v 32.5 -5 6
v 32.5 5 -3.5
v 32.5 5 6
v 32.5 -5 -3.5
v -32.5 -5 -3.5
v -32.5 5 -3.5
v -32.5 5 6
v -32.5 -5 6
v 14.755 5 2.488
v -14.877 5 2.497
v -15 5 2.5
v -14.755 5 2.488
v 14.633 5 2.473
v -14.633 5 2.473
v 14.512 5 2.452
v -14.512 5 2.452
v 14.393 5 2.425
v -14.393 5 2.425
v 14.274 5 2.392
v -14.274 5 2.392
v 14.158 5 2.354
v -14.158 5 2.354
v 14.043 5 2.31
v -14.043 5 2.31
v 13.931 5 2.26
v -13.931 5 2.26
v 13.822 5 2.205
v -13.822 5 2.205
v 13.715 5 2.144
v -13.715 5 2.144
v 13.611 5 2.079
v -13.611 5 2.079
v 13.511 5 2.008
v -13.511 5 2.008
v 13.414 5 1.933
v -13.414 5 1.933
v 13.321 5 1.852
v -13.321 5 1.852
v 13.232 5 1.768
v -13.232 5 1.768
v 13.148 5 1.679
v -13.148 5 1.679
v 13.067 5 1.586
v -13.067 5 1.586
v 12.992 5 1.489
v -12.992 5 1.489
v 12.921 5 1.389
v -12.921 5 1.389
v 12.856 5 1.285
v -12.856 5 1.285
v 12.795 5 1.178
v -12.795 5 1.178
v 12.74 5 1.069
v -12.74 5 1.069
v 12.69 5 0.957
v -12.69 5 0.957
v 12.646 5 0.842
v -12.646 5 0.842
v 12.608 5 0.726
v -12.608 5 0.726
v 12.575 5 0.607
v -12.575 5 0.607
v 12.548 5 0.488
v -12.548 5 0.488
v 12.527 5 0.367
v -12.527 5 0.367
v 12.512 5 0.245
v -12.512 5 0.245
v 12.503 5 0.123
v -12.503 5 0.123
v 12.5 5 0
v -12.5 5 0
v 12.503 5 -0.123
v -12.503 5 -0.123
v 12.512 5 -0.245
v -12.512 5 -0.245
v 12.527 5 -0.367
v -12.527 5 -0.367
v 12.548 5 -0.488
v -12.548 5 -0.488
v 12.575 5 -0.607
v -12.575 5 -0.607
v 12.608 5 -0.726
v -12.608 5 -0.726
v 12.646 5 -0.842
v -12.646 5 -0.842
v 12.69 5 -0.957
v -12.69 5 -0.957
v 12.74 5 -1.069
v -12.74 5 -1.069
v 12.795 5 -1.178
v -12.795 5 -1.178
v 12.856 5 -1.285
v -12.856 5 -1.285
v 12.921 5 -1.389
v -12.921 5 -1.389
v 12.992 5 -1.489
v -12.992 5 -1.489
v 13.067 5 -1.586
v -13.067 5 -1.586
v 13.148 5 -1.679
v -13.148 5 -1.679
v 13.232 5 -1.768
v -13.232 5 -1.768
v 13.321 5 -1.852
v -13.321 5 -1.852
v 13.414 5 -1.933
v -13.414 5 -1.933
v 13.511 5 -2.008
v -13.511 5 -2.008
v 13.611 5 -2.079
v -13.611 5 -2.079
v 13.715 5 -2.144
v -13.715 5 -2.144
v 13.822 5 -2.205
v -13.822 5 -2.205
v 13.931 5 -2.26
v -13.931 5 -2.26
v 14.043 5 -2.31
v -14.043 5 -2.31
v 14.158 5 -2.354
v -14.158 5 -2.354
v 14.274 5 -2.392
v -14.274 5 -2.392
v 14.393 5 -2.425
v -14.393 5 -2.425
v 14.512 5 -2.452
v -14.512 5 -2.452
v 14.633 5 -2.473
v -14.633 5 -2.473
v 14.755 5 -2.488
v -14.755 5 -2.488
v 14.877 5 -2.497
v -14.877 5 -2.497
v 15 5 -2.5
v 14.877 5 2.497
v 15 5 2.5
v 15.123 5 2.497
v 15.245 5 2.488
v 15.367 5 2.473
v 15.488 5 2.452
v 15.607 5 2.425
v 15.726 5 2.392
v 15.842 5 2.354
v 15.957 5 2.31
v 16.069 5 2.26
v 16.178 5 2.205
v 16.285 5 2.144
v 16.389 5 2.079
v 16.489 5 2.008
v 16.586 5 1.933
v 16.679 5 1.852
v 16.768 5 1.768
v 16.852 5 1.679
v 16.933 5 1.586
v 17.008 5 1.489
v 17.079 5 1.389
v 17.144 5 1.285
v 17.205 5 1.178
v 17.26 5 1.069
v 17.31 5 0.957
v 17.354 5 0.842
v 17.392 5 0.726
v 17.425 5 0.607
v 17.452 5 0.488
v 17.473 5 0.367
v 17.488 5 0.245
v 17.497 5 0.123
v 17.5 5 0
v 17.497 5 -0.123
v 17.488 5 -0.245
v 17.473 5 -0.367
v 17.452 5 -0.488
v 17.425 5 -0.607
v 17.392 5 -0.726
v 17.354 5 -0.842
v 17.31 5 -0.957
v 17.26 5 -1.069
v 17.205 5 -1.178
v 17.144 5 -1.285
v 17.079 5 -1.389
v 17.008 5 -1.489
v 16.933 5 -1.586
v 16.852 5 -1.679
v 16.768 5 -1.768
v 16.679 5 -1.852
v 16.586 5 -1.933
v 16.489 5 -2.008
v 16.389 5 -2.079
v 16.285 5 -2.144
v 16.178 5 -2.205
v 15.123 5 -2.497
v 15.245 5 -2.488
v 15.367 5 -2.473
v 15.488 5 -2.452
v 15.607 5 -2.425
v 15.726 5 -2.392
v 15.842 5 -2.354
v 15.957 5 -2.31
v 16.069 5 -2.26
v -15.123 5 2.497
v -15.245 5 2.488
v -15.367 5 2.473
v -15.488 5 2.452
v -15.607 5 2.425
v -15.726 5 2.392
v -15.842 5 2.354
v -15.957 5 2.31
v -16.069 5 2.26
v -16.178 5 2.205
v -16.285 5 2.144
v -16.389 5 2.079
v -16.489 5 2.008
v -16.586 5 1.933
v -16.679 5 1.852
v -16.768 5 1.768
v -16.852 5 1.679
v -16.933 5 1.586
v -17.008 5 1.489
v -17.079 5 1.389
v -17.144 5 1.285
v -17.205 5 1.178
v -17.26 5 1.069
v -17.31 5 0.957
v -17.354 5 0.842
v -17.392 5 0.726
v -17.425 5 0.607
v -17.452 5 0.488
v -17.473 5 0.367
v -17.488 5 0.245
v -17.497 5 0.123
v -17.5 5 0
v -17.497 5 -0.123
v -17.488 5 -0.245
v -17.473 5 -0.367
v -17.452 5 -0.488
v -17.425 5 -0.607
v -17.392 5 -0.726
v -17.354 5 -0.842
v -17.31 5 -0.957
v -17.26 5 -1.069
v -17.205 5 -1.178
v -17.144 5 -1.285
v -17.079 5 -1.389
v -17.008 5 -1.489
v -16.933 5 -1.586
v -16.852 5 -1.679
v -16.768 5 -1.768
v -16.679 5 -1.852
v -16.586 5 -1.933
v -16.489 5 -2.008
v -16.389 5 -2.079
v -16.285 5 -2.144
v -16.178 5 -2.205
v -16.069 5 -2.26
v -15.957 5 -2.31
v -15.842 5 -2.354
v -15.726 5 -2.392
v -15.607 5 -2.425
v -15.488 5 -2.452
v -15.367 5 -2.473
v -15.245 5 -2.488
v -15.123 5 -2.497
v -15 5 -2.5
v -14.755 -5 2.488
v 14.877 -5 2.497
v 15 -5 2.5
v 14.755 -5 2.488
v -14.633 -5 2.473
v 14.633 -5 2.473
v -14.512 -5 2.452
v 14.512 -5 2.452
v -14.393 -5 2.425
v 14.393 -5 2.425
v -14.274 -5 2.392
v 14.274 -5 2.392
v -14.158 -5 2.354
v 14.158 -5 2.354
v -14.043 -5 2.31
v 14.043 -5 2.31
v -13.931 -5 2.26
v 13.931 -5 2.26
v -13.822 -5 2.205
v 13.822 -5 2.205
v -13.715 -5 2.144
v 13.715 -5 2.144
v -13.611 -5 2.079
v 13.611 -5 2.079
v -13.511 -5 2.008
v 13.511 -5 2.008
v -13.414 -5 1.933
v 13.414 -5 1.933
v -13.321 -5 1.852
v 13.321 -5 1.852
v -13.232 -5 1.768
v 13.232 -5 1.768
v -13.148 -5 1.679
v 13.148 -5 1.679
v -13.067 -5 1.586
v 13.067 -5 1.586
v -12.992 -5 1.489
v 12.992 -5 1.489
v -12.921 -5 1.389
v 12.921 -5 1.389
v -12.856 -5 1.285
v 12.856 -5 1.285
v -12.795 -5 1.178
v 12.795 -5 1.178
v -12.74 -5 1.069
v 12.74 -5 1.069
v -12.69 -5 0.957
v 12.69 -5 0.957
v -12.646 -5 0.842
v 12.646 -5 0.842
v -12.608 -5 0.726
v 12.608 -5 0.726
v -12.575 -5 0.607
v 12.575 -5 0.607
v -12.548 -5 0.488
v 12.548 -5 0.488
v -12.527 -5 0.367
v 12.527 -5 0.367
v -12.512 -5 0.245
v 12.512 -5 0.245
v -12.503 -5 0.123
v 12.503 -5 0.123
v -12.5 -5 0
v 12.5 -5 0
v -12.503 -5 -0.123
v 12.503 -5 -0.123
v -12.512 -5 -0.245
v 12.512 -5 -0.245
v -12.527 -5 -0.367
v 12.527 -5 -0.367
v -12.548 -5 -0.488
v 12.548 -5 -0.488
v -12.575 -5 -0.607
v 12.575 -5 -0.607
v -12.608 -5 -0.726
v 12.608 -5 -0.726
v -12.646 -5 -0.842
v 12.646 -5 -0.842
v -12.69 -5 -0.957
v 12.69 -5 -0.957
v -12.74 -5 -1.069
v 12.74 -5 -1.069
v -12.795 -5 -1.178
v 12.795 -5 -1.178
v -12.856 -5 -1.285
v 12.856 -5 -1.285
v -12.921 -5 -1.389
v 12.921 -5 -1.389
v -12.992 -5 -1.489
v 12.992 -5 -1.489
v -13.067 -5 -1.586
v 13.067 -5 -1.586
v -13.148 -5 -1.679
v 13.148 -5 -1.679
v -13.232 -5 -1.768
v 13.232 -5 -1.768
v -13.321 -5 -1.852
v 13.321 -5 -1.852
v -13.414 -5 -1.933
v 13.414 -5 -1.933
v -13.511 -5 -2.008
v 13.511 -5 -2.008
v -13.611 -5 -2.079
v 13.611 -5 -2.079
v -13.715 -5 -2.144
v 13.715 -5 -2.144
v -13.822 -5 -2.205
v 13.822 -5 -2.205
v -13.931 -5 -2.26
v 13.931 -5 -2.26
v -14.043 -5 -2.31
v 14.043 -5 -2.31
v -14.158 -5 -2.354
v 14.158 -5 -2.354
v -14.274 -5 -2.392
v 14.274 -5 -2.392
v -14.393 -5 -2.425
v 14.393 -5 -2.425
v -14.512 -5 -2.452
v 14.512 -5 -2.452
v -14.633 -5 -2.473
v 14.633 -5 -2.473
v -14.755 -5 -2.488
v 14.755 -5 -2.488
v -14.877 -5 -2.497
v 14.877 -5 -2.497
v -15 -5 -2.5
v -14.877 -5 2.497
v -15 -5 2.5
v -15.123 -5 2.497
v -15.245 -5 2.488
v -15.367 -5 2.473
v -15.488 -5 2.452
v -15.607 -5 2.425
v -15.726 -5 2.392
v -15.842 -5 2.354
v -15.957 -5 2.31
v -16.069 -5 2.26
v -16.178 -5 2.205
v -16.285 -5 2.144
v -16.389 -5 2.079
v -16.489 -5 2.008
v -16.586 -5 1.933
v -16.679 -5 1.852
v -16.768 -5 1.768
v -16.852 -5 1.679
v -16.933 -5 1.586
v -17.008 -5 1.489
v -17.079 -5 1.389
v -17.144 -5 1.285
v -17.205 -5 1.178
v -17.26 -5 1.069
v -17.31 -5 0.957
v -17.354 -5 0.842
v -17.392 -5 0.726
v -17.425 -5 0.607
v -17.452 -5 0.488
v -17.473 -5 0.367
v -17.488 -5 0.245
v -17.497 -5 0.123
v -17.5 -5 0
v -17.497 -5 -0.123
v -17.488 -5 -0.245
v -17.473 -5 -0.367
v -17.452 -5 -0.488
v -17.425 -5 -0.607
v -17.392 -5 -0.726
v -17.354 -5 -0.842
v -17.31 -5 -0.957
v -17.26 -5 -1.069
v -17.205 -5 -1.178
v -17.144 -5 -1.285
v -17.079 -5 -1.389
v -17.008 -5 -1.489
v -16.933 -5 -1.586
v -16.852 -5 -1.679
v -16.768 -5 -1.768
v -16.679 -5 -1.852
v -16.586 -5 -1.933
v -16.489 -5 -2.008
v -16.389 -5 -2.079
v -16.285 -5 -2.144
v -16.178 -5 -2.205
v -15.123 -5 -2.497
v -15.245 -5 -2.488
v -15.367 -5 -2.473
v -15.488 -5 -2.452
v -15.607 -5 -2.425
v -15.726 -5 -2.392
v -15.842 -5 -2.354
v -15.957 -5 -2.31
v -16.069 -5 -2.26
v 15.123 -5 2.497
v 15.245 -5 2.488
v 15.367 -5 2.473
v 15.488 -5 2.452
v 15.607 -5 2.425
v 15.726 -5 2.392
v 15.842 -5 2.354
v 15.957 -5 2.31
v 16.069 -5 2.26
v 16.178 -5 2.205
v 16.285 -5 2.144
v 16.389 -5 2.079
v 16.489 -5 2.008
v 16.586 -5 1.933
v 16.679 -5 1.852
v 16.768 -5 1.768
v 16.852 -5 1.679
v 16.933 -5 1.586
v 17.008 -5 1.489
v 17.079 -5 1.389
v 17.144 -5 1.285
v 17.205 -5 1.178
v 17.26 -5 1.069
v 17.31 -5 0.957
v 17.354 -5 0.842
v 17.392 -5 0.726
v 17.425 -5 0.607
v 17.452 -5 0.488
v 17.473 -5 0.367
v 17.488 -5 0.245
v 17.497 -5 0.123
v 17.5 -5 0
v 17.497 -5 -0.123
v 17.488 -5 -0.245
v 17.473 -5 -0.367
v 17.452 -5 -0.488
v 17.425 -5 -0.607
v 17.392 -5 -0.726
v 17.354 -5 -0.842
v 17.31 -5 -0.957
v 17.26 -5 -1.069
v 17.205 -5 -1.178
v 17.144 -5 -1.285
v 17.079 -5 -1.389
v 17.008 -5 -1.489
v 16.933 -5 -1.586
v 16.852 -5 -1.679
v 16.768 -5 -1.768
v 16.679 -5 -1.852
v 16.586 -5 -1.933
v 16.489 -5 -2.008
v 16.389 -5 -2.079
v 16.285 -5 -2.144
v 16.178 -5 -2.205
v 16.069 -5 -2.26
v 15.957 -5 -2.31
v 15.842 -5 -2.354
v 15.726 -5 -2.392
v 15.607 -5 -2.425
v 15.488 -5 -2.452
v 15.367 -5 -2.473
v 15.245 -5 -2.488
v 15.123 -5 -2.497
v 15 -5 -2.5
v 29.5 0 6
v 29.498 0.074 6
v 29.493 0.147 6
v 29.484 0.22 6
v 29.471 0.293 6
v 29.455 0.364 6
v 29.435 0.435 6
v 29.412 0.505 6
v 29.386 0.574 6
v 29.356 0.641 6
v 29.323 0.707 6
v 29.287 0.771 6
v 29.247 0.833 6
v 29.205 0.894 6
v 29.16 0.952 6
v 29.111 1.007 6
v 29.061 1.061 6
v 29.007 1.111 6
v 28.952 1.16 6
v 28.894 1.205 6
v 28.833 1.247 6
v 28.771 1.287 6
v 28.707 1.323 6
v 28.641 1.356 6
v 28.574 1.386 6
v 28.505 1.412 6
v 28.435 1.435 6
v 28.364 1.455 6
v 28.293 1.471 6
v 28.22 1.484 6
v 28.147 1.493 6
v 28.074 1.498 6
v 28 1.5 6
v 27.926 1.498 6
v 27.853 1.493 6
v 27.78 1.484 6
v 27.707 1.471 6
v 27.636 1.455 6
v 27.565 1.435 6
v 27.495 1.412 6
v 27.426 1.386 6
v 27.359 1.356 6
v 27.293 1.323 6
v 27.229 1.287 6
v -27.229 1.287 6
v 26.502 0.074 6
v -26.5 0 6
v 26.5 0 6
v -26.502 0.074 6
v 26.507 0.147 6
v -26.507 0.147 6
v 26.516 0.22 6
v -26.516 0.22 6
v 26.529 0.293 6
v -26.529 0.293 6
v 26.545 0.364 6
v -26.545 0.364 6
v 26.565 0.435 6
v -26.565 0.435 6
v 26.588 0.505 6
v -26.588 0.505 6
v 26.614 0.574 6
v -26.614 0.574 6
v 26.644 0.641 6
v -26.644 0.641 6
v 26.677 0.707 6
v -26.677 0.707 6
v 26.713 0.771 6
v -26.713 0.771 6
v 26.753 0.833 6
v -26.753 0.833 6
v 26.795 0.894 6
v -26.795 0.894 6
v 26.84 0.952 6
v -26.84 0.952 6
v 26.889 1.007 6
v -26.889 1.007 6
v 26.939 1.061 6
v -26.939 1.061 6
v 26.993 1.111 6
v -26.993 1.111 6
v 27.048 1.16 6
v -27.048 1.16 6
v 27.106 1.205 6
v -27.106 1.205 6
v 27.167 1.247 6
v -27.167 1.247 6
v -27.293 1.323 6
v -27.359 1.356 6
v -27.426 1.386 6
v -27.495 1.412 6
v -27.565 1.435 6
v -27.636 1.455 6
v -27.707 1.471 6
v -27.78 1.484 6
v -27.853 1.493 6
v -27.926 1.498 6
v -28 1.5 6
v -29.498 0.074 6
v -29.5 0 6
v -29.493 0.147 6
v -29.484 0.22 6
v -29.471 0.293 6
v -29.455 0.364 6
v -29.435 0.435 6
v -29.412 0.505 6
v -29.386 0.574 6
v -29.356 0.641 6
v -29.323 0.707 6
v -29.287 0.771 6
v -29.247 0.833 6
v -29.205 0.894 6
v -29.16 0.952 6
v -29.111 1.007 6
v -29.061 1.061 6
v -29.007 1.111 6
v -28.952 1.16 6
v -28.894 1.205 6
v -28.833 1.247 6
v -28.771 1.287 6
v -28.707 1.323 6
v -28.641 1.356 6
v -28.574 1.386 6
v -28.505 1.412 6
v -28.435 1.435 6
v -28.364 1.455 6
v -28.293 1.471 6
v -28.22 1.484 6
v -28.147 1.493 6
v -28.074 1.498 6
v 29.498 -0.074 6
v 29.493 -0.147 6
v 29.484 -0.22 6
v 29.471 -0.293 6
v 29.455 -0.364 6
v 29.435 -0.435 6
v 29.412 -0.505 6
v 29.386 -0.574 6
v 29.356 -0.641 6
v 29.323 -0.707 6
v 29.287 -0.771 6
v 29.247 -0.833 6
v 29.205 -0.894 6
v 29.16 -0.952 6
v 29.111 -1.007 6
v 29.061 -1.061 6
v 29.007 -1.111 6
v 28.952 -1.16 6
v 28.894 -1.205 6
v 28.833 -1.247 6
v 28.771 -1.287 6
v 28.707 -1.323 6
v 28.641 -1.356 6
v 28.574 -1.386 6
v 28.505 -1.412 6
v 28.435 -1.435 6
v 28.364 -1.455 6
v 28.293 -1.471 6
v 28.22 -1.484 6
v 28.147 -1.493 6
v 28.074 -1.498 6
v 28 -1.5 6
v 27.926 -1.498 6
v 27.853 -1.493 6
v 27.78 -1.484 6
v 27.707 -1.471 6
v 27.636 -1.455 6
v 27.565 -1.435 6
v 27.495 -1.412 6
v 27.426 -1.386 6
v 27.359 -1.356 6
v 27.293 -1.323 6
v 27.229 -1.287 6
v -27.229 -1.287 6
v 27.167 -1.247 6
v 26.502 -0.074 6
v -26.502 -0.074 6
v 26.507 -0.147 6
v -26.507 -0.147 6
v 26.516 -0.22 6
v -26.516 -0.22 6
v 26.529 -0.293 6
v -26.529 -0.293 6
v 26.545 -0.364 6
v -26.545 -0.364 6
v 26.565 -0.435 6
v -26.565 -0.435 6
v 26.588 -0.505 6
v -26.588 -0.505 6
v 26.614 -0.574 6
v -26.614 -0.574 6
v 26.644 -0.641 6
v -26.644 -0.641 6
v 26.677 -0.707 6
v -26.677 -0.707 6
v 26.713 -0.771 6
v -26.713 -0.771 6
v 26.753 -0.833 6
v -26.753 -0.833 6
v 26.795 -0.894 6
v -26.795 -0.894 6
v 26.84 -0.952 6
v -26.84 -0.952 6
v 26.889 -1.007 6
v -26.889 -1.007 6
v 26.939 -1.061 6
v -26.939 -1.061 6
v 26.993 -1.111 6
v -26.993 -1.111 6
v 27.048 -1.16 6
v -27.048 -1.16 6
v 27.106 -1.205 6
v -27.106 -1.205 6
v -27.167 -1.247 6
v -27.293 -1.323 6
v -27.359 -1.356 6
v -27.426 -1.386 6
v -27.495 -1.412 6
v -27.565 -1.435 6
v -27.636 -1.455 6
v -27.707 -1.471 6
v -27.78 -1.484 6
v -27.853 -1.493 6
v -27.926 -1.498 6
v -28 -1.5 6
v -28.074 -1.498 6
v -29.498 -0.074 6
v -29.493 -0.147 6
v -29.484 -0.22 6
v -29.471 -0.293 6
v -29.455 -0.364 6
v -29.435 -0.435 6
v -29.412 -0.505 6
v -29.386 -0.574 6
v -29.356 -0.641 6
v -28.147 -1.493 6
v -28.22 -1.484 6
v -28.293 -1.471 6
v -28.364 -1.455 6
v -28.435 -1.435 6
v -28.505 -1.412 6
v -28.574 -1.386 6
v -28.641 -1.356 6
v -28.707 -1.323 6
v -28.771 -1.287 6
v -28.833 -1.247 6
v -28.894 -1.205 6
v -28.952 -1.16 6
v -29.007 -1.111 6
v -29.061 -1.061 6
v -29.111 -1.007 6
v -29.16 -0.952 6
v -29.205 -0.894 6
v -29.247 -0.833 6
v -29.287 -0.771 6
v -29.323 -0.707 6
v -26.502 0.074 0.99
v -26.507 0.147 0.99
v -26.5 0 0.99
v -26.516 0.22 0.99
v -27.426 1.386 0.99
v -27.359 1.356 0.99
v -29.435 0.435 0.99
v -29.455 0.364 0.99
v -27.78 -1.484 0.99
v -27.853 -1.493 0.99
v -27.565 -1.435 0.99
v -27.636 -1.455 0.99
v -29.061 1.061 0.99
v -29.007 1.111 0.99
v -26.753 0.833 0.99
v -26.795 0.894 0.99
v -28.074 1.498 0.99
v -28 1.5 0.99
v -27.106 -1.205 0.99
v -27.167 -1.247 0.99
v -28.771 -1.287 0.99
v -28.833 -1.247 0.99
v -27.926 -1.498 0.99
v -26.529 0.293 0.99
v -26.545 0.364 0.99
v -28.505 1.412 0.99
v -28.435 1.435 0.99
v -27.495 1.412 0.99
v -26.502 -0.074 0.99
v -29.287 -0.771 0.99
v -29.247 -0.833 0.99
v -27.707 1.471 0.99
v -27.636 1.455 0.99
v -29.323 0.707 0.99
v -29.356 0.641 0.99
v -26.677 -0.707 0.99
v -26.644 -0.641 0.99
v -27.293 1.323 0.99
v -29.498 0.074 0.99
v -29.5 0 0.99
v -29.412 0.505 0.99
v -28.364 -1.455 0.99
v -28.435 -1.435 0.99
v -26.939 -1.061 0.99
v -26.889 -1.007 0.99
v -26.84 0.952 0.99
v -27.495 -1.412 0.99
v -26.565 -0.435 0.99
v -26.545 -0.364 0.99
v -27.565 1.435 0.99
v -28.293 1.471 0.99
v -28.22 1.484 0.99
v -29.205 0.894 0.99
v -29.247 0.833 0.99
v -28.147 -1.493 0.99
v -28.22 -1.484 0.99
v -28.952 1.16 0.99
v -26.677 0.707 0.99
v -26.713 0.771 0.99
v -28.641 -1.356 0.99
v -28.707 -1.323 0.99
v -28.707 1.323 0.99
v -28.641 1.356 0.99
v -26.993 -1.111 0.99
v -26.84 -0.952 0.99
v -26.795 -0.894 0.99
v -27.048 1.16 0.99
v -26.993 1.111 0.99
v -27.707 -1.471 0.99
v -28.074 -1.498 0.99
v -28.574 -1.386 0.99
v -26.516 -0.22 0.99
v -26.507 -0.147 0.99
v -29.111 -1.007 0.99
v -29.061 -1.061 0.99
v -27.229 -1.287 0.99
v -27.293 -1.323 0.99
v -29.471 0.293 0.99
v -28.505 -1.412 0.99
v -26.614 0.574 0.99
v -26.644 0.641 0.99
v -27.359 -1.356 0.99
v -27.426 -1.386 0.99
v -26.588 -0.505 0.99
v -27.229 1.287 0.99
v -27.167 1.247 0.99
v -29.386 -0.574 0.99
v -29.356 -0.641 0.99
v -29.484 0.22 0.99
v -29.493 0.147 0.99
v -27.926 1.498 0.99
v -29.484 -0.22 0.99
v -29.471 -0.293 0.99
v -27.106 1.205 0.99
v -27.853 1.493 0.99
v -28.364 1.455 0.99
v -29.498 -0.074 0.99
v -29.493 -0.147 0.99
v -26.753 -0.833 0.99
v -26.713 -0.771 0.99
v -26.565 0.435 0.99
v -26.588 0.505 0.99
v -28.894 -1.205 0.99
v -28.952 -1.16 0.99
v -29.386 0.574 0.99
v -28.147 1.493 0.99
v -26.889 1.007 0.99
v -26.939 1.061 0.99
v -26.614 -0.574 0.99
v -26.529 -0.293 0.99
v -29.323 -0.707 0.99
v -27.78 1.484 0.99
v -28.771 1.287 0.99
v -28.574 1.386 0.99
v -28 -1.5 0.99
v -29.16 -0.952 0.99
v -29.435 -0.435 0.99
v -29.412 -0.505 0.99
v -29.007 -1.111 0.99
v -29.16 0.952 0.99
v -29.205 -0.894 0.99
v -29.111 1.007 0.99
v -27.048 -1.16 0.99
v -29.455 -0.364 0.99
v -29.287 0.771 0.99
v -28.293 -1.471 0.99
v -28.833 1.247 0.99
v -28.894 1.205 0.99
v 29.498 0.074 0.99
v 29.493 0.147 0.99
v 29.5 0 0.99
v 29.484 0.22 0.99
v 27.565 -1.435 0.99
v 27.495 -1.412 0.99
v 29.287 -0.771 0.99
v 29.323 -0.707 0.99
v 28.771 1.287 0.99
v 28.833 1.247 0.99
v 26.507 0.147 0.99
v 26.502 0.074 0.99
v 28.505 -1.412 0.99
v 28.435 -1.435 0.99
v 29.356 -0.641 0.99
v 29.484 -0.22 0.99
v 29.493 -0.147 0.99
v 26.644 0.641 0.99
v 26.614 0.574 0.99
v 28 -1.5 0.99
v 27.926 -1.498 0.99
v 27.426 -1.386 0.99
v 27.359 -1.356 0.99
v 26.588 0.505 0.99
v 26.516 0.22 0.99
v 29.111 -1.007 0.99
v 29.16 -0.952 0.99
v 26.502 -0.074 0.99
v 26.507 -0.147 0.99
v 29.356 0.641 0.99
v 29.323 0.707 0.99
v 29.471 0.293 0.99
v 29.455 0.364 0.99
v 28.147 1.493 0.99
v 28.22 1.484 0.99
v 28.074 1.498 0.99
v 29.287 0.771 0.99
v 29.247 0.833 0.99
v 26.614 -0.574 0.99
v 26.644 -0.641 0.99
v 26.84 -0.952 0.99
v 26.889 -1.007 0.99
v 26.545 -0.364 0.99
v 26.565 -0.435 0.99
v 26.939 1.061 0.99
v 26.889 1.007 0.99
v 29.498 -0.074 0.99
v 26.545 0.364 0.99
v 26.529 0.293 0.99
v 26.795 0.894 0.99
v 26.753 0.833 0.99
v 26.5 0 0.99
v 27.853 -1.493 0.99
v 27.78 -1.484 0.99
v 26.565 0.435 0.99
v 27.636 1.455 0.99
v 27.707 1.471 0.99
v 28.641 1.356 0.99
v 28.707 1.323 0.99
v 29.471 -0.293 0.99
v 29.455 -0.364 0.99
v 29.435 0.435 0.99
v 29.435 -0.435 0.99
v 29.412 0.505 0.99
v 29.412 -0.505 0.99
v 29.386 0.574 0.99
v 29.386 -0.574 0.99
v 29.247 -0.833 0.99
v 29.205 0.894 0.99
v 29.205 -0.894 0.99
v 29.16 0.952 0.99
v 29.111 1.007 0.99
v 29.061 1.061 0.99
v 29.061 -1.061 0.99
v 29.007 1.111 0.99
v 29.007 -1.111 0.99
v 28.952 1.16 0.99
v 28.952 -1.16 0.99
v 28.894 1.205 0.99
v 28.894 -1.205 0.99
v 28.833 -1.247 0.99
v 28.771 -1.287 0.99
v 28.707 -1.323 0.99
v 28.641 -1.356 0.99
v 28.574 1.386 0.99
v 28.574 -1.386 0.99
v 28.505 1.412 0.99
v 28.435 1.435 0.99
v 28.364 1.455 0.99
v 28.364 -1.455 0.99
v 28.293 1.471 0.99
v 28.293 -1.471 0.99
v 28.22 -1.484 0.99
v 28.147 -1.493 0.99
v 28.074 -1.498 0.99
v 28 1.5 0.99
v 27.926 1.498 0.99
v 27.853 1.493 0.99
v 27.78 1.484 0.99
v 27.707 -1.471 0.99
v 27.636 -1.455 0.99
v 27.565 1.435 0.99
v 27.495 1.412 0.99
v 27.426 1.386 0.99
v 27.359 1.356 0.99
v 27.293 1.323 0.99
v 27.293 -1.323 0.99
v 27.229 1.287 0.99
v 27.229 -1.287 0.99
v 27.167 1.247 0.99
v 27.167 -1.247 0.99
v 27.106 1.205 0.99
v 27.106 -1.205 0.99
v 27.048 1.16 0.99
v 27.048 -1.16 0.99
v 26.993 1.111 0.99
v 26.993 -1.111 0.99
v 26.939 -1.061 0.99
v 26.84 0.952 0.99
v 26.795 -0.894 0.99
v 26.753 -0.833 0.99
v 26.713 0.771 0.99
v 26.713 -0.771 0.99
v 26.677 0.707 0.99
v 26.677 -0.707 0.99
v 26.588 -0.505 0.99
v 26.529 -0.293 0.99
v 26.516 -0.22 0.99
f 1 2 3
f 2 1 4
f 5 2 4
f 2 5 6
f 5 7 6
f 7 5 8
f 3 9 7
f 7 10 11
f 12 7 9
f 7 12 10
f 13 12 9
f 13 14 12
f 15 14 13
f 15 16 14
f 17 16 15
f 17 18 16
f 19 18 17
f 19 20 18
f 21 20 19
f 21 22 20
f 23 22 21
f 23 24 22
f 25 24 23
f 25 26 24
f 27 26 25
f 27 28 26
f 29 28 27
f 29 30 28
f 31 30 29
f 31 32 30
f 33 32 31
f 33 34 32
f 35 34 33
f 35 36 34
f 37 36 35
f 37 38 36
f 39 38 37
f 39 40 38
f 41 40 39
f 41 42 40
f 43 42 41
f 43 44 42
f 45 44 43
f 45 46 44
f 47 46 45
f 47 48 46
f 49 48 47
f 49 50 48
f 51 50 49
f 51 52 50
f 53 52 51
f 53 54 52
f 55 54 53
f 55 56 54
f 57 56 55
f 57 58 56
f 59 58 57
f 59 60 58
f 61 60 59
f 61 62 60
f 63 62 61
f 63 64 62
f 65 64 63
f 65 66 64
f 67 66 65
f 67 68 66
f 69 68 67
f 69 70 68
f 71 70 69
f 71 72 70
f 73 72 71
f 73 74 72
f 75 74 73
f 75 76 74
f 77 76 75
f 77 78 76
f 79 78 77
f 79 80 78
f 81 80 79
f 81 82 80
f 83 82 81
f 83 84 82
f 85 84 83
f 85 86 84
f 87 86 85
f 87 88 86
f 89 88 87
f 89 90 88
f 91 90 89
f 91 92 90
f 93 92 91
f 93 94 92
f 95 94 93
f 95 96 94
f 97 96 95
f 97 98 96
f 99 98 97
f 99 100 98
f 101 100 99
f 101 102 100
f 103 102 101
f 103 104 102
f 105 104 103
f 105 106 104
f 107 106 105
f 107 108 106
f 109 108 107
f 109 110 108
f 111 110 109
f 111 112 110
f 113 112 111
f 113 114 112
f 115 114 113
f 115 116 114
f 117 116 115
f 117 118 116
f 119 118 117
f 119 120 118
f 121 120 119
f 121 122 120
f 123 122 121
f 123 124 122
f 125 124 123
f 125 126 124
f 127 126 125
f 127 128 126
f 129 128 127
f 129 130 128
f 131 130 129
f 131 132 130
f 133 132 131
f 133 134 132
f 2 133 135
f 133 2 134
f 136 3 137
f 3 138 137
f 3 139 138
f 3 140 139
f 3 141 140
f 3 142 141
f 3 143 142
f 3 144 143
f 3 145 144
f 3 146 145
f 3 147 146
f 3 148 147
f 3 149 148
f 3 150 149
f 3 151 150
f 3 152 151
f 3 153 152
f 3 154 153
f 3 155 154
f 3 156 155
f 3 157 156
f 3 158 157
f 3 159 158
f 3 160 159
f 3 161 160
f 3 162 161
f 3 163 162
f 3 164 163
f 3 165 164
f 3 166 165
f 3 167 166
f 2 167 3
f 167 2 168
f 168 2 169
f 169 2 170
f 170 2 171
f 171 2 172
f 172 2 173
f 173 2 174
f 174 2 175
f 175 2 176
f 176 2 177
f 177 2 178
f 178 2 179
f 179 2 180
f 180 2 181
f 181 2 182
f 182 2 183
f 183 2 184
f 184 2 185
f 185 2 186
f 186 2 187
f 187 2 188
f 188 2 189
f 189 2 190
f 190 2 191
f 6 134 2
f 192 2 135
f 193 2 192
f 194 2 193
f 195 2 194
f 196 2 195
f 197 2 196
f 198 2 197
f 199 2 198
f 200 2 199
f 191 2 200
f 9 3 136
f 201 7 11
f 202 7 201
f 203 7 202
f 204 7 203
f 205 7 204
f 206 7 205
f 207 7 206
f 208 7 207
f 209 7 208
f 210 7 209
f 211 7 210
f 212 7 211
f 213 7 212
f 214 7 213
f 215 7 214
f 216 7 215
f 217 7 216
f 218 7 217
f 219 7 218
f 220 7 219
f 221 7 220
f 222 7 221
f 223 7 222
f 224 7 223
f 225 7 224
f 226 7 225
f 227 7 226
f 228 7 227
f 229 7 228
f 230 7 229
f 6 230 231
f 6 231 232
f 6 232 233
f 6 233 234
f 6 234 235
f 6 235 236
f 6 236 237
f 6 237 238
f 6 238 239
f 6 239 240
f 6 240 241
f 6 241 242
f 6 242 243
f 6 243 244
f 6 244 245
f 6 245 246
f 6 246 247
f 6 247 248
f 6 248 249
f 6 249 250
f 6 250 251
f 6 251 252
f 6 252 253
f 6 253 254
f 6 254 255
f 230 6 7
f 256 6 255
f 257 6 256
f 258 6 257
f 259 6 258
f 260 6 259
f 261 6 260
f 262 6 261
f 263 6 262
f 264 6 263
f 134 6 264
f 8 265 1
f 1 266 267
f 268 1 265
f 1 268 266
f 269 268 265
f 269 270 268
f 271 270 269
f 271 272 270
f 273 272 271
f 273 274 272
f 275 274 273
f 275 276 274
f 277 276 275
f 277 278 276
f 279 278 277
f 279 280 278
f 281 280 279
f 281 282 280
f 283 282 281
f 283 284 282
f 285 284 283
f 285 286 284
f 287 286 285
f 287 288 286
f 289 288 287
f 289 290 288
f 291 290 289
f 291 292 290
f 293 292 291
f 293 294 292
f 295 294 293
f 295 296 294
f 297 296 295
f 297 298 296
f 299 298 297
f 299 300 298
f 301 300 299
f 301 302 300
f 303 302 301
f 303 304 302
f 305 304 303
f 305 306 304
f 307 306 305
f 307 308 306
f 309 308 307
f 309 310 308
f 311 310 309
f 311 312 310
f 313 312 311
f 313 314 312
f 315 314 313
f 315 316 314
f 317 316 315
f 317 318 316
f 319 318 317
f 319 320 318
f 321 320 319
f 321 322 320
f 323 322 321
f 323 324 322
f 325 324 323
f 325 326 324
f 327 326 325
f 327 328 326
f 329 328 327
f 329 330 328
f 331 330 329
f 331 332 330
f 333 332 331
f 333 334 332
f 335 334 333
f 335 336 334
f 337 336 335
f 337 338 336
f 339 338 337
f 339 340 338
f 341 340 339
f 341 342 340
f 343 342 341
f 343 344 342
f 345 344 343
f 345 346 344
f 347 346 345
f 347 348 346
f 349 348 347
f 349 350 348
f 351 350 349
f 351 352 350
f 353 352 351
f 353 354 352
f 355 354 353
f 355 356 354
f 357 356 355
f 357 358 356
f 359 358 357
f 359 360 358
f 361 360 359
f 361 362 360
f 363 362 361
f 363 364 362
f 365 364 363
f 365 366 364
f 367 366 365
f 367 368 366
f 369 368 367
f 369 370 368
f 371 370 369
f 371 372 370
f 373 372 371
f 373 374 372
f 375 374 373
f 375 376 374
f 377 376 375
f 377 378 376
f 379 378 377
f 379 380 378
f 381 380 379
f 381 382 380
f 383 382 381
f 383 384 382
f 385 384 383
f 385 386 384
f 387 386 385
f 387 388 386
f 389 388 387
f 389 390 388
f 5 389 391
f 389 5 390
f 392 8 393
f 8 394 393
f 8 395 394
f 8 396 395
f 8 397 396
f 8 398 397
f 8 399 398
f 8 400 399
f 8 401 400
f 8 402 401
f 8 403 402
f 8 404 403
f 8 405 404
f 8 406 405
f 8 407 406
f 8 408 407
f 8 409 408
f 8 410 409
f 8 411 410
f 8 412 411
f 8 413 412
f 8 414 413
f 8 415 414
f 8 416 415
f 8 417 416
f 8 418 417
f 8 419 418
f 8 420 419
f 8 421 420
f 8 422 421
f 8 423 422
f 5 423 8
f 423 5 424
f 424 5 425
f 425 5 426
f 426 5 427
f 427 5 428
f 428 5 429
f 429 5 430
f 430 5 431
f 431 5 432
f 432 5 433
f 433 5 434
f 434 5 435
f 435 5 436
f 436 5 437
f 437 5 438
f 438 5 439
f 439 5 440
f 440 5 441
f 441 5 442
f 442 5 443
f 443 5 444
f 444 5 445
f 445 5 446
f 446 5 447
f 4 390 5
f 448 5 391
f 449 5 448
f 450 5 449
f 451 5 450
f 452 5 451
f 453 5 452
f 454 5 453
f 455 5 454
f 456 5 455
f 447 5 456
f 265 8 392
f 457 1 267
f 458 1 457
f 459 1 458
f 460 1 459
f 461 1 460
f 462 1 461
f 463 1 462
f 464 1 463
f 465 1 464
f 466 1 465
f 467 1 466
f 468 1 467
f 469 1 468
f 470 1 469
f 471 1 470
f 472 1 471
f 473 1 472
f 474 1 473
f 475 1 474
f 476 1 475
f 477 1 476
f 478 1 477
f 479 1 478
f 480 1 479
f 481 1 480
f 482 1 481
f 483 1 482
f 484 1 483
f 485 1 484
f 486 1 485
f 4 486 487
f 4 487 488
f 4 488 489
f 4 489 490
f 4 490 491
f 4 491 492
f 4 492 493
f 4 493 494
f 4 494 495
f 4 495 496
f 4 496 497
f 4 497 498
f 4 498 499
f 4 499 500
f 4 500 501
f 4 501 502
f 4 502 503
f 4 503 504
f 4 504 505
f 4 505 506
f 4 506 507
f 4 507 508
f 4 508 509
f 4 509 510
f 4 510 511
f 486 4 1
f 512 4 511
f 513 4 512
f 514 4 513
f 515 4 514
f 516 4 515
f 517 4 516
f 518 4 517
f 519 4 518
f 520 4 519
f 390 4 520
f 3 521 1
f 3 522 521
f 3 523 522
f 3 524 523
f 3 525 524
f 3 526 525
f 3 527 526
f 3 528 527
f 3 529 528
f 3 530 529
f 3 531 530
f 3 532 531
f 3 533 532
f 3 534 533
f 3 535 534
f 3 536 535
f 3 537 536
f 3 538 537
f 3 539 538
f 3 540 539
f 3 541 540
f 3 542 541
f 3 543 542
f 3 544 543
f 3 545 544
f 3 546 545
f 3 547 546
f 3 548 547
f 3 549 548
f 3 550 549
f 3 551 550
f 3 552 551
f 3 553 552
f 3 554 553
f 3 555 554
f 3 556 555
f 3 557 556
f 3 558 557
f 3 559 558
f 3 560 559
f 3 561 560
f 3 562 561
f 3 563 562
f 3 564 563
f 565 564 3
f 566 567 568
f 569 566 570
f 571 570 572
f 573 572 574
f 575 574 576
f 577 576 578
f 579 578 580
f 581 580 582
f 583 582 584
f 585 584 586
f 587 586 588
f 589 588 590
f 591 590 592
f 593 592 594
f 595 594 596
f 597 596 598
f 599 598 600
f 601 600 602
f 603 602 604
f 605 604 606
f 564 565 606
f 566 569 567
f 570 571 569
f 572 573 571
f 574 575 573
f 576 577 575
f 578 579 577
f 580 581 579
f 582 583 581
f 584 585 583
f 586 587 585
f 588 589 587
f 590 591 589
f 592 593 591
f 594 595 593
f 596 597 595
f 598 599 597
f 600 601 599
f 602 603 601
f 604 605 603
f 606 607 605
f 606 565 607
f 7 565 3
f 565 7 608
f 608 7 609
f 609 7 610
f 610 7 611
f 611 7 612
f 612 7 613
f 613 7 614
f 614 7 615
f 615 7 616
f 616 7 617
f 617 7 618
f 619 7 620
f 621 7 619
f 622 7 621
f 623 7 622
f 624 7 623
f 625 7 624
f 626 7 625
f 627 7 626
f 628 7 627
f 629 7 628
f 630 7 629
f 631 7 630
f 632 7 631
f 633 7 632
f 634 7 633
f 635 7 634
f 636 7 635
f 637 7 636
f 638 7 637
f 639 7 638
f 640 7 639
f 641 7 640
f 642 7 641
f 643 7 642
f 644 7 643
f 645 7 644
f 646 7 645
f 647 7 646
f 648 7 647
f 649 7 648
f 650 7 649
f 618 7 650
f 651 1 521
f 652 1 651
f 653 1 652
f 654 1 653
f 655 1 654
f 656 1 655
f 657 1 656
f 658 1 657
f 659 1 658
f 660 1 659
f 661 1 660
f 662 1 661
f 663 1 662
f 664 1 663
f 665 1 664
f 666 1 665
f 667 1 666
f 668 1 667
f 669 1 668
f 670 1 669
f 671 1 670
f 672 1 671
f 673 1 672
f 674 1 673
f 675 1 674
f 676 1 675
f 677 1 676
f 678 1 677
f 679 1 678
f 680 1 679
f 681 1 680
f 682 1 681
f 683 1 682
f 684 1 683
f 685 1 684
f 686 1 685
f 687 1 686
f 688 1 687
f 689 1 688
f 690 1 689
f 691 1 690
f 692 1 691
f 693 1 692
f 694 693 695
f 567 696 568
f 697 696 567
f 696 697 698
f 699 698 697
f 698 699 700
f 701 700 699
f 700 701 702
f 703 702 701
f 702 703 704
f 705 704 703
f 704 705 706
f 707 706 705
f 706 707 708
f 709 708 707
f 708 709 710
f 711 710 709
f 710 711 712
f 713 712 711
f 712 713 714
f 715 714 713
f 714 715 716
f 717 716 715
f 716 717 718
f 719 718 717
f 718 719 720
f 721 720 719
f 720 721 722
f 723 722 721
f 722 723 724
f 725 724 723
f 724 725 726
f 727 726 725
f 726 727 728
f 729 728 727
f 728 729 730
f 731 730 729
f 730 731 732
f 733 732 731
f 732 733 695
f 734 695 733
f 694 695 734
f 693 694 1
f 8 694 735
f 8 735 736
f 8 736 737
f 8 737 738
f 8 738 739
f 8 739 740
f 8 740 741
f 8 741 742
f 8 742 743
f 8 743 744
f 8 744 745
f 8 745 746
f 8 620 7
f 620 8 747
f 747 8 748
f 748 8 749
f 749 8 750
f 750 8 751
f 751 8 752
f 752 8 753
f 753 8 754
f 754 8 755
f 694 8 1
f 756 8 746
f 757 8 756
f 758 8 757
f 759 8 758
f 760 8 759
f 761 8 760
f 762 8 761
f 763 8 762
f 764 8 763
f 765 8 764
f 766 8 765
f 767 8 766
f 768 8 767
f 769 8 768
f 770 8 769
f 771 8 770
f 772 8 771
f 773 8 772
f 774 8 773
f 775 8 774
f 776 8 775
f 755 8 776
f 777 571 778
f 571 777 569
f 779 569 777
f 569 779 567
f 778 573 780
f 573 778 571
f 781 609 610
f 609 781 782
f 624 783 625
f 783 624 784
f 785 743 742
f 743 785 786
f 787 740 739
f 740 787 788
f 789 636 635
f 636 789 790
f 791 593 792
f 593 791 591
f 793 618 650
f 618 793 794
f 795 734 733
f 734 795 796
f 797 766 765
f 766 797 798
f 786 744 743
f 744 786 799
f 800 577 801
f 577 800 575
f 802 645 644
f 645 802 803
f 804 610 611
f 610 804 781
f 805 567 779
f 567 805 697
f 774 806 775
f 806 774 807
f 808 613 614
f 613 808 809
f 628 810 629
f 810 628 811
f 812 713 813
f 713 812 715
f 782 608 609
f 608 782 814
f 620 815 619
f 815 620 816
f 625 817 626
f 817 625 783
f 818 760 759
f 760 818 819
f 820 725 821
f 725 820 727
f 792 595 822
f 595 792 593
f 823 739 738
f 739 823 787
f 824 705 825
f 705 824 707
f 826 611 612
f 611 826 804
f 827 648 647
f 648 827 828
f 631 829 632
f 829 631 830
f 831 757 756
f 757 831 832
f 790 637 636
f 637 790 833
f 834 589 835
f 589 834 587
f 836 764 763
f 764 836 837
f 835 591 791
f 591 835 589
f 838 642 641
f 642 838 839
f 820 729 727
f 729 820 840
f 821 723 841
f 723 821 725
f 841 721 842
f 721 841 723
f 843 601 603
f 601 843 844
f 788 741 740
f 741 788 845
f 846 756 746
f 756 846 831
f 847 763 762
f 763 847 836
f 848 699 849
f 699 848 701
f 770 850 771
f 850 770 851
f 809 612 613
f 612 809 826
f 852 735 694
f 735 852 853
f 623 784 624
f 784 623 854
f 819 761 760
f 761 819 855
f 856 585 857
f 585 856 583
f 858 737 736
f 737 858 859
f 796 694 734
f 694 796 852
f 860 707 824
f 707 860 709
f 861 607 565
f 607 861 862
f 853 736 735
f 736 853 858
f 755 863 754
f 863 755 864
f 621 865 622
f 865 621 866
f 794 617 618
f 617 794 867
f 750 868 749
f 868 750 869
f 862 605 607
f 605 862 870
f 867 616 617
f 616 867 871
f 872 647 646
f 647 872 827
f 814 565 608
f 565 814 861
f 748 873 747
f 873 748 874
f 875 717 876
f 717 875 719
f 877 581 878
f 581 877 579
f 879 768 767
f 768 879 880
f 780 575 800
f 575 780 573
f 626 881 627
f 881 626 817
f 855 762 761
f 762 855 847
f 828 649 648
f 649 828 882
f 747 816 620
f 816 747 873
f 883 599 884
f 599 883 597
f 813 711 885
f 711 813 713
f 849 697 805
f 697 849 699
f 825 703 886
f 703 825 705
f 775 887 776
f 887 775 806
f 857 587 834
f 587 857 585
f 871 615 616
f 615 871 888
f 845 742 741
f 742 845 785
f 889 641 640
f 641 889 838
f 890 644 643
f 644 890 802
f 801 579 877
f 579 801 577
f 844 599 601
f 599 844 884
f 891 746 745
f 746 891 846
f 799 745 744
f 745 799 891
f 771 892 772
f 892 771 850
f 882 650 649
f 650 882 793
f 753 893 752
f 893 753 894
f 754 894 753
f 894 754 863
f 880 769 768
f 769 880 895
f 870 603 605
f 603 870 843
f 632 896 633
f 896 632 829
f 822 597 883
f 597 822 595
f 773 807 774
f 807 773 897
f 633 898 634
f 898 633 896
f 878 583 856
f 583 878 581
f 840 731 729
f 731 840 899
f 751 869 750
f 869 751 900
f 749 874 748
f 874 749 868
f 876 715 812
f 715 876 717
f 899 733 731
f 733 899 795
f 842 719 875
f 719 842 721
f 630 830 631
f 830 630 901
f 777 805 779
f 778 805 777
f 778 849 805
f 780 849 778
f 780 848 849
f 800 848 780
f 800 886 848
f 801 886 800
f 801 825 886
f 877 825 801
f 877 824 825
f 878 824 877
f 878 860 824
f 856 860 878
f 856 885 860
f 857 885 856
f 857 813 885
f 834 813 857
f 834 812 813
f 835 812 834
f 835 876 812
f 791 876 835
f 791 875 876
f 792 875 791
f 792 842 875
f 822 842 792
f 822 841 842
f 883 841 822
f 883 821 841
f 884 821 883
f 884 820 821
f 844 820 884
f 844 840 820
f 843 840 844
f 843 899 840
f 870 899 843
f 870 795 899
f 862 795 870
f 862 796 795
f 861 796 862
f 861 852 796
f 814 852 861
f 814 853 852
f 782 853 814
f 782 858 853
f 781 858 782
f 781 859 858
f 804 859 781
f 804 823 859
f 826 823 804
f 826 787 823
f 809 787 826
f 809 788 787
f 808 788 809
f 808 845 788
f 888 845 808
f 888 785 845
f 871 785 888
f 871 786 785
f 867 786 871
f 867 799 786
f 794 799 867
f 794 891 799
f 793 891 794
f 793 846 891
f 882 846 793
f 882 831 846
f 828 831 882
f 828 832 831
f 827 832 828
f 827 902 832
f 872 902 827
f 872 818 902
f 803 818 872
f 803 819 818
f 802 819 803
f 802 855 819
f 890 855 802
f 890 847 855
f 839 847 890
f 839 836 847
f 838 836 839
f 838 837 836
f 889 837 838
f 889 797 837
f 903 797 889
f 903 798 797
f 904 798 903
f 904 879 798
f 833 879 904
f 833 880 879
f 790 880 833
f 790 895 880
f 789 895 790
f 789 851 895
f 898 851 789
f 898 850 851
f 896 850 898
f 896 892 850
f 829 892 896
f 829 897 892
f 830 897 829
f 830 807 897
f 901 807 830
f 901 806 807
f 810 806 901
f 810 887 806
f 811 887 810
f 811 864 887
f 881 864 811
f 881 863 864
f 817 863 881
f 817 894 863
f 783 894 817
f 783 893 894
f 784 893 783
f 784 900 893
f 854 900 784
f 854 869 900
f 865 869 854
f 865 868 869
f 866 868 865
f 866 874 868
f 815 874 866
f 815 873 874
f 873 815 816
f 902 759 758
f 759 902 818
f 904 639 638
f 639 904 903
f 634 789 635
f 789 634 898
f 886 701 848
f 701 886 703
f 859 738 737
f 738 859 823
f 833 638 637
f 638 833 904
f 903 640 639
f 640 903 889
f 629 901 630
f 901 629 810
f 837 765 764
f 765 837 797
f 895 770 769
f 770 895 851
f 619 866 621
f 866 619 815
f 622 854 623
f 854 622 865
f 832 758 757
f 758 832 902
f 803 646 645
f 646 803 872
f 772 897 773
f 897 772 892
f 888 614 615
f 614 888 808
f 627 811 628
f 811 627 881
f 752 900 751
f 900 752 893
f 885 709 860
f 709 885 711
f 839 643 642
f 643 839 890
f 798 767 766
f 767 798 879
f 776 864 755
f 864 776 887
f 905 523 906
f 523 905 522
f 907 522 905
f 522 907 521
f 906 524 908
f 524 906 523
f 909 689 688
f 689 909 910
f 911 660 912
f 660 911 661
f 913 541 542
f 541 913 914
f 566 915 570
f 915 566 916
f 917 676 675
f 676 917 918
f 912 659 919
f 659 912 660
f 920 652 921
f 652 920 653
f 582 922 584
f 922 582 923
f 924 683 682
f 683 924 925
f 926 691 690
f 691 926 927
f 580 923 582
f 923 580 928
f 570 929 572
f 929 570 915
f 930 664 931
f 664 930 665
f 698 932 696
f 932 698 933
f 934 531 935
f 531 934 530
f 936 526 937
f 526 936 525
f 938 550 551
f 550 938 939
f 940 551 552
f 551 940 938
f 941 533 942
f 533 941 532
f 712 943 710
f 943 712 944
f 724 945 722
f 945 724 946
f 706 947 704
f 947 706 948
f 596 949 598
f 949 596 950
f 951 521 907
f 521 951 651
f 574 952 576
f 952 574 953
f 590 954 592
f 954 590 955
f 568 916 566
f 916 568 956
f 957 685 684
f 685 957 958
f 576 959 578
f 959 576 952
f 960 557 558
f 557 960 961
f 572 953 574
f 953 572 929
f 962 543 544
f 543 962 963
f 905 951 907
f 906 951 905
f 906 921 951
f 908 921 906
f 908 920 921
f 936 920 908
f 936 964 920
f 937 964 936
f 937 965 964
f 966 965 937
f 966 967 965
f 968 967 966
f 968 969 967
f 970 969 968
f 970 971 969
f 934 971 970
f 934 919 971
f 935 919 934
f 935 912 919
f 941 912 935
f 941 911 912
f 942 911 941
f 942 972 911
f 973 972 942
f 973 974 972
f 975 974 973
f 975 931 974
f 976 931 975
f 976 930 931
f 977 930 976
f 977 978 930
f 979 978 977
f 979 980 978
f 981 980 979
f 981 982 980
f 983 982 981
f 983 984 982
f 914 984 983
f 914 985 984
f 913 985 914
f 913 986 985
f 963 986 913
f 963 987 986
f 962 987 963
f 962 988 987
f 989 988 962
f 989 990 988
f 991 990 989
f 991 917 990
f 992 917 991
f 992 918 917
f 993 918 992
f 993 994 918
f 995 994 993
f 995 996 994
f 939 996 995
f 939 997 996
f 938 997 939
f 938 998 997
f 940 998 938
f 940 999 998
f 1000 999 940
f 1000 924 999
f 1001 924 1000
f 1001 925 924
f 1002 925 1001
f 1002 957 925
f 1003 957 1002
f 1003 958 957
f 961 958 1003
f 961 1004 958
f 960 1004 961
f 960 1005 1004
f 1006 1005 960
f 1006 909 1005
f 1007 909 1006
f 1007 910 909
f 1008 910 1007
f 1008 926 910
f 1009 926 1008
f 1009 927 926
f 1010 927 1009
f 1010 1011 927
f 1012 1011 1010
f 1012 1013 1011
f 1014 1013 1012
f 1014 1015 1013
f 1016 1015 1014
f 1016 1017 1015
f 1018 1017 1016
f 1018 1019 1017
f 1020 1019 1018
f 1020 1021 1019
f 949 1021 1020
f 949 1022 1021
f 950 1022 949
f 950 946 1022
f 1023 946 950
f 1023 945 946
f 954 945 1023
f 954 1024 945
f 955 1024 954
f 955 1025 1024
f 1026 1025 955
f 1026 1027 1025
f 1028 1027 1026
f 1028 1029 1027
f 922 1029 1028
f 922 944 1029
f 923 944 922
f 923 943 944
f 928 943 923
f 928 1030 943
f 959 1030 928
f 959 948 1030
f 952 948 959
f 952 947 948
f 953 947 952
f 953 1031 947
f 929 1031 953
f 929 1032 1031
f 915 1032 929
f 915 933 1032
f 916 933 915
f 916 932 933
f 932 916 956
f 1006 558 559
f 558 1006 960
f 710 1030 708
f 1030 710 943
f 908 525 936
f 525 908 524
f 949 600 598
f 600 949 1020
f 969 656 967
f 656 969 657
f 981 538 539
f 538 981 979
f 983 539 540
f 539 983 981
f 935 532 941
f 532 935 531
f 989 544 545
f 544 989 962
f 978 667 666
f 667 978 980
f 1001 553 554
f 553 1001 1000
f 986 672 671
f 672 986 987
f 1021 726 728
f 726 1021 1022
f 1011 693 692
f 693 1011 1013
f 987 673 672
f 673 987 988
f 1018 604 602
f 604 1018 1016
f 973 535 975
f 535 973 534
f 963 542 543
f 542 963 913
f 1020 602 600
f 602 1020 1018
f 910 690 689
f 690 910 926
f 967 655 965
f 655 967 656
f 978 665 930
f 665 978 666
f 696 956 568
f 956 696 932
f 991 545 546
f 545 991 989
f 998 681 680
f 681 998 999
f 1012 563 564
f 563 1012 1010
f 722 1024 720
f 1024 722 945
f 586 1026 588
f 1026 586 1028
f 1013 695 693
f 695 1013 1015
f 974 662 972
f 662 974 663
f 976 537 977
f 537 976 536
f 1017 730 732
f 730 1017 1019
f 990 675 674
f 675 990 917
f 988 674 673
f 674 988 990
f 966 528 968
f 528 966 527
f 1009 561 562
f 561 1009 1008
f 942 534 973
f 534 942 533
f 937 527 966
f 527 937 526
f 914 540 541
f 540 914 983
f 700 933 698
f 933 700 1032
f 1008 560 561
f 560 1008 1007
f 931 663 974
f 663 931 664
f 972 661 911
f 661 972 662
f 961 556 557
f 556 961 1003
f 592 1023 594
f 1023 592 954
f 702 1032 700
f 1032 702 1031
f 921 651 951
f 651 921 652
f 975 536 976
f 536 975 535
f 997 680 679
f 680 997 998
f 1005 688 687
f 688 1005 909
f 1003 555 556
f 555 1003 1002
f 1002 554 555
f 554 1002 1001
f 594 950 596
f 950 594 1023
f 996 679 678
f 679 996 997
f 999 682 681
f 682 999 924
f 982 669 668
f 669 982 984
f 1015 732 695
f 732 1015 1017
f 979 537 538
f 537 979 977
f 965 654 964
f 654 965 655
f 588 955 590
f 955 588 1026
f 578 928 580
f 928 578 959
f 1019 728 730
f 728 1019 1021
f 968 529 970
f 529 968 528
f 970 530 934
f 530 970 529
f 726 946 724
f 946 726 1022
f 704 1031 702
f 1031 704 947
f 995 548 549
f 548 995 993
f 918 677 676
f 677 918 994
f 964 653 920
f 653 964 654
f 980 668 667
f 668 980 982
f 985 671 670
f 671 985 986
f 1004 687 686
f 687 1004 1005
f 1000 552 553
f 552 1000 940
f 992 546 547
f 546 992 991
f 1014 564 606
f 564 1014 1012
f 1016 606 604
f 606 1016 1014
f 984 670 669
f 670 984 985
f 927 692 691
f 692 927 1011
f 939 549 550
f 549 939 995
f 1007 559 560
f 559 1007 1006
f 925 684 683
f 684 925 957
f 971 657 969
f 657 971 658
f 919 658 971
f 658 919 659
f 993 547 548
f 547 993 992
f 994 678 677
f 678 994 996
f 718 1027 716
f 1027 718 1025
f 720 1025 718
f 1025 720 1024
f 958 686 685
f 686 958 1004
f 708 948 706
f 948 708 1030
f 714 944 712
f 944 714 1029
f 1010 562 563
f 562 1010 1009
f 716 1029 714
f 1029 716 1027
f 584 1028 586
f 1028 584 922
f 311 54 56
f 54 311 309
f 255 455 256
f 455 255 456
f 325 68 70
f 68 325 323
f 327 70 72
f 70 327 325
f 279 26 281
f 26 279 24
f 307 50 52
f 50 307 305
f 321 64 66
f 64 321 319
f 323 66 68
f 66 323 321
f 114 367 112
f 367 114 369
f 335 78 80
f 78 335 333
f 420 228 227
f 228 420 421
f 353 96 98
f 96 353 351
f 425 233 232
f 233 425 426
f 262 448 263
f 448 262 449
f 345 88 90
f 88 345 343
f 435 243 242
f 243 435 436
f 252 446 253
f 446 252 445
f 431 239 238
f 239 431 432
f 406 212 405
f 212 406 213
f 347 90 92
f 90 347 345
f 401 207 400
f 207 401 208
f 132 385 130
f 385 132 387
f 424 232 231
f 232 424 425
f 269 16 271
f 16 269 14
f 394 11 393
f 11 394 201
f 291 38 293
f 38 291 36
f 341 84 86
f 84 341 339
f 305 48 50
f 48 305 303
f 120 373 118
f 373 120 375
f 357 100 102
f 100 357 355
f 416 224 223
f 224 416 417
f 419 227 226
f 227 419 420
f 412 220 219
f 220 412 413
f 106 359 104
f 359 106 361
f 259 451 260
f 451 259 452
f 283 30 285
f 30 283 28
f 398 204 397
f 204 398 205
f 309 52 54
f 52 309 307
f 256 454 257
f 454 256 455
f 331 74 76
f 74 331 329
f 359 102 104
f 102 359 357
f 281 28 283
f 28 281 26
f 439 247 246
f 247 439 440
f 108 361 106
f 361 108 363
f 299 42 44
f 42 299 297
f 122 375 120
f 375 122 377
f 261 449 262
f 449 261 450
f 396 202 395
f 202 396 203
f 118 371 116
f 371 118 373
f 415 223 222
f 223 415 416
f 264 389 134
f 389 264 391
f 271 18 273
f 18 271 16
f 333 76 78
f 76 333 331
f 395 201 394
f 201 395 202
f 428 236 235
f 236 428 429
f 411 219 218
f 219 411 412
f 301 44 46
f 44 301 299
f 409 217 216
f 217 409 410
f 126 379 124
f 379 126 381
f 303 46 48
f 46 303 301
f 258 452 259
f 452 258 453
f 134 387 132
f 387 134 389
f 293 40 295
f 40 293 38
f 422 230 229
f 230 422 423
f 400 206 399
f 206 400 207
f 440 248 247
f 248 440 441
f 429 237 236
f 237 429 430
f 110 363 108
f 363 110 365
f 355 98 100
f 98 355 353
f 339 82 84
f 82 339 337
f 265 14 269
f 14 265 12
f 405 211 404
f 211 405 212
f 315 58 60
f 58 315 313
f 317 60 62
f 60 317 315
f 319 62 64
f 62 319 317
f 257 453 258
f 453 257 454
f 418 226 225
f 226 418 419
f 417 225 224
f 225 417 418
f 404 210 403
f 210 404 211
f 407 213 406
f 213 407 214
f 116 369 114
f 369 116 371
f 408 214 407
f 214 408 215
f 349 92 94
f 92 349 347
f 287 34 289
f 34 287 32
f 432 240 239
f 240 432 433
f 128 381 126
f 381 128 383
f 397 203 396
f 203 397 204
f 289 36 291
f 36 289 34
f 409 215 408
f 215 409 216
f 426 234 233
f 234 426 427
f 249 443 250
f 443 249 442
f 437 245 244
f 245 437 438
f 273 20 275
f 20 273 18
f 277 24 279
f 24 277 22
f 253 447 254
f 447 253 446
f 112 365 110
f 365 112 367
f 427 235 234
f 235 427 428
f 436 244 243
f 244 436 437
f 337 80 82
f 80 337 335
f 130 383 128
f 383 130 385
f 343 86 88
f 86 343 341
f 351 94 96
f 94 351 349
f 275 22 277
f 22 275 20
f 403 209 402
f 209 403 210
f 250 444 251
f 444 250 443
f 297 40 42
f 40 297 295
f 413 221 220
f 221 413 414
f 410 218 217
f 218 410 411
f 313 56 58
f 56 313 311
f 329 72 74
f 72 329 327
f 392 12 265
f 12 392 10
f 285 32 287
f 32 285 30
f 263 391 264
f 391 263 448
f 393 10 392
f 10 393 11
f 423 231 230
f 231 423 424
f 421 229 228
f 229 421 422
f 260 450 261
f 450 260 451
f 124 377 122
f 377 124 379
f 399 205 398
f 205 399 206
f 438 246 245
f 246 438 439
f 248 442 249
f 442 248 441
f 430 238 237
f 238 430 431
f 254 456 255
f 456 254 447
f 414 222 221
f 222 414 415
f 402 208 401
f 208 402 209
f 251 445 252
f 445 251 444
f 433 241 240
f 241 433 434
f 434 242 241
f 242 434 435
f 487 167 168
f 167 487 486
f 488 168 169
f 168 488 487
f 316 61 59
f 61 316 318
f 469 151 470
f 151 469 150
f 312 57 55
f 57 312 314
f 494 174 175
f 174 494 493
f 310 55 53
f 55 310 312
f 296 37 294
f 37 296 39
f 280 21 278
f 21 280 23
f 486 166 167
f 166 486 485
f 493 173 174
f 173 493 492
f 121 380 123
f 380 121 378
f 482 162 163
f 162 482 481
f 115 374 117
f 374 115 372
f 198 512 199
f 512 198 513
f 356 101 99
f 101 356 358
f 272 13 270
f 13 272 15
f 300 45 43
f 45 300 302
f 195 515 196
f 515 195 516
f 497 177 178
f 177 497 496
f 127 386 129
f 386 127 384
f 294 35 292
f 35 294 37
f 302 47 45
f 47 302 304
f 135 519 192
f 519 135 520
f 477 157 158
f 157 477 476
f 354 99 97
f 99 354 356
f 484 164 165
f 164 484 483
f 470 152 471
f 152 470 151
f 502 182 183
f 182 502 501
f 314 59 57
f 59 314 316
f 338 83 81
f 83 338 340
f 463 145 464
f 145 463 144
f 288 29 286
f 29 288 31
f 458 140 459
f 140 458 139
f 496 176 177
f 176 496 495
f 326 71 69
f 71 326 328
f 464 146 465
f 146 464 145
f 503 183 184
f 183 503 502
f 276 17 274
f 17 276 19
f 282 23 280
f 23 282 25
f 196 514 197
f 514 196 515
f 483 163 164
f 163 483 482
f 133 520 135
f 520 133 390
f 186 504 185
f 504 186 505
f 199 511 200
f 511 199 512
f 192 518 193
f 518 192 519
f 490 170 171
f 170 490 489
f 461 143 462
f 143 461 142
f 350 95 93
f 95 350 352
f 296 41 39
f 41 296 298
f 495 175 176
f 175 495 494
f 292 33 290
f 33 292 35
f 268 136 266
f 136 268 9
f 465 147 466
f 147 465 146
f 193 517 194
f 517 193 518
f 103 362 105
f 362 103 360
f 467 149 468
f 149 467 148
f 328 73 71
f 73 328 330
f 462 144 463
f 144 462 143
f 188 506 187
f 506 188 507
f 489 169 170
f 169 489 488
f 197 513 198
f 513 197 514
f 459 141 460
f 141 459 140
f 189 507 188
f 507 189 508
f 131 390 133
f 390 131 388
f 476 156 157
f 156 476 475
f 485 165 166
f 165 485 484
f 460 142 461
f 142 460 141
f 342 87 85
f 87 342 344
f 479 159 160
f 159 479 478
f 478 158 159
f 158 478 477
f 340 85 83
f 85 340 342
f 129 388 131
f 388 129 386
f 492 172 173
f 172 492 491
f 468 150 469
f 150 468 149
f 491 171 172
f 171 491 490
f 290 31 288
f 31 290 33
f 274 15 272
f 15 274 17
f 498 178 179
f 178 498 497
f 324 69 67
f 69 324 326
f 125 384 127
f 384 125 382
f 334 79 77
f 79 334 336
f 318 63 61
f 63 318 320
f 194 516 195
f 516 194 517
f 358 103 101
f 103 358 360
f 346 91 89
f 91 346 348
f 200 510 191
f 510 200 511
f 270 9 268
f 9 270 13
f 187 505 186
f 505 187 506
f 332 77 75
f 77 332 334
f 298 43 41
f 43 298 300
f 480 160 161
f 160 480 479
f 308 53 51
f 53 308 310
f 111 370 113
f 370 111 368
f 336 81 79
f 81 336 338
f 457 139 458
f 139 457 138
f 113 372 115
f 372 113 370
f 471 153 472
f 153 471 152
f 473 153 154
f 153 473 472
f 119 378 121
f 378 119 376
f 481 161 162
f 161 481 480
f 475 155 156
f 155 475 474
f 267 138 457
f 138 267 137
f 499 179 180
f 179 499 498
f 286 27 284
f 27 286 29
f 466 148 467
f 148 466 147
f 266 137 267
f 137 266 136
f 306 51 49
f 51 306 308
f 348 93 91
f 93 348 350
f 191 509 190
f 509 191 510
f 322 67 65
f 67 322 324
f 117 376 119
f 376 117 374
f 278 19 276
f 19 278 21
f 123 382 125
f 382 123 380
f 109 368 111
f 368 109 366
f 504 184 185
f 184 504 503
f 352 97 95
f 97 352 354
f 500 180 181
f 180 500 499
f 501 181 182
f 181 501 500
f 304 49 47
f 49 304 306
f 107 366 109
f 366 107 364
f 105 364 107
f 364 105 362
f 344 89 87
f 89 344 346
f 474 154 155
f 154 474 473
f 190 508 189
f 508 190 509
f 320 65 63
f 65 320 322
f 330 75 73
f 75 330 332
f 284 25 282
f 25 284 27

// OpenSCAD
// file: common.scad
eps = 0.01;
$fn= $preview ? 32 : 128;

x_carriage_width = 65;
y_carriage_depth = 50;

x_rod_spacing = 30;
x_rod_height = 40;
y_rod_spacing = 30;
y_rod_height = 48;

lin_bearing_OD_measured = 9.97;
lin_bearing_OD = lin_bearing_OD_measured + 0.2; // needs more clearance when 3D printing in XY plane
lin_bearing_length = 14.95;

rod_OD = 4.98;
rod_clr = 1;
rod_pressfit_horiz = 5.0; // a bit tight, but a little filing makes a good snug fit
x_rod_length = 215;
y_rod_length = 215;

M3_self_thread = 3.0; // for vertical (along 3D printer Z axis) holes only.
M3_pass_through = 3.2; // for vertical holes only
M3_self_thread_horiz = 2.6; // for horizontal (along 3D printer XY plane) holes only.

pulley_deck_height = 54;

pen_lifter_bolt_pattern_diameter = 25;

// LIN Engineering stepper 4118M-39D-01
stepper_bolt_pattern_diameter = 43.51;
stepper_axle_diameter = 4.98;
stepper_axle_length = 22;
stepper_body_width = 42.5;
stepper_body_depth = 42.5;
stepper_body_height = 39.6;
stepper_boss_diameter = 22;
stepper_boss_height = 2;
stepper_rear_axle_length = 8.5;

pulley_diameter = 12; // the effective diameter of the pulley. from highest points on teeth across
belt_thickness = 2; // the thickness of the belt, not including the teeth

inner_idler_spacing = 2*(pulley_diameter + belt_thickness); // the distance between the two inner idlers on the x carriage
outer_idler_spacing = 4*(pulley_diameter + belt_thickness); // the distance between the two outer idlers on the x carriage
outer_idler_offset = pulley_diameter; // how far forward the outer idlers are offset from the center line of the x axis
// main file
// sits opposite the X carriage on the Y axis rods
// maintains Y axis rod separation and has two pulleys the belt wraps around

include <common.scad>

width = x_carriage_width;
depth = 10;
height = 1 + rod_pressfit_horiz + 1;

pm_height = 5;
module pulley_mount_deck() {
  // This module's Z position is relative to the pulley system's deck height. Since pulleys mount on top of this, it's top surface is Z=0.
  translate([0, 0, -pm_height/2])
    cube([width, depth, pm_height], center=true);
}

module pulley_mount_holes() {
  // This module's Z position is relative to the pulley system's deck height. Since pulleys mount on top of this, it's top surface is Z=0.
  outer = outer_idler_spacing / 2;
  pulleys = [
    [-outer, 0],
    [+outer, 0]
  ];
  translate([0, 0, -pm_height/2])
    for (i=[0:1])
      translate([pulleys[i].x, pulleys[i].y, -pm_height/2-eps])
        cylinder(d=M3_self_thread, h=pm_height*1.1);
}

module y_axis_endcap() {
  difference() {
    union() {
      cube([width, depth, height], center=true);
      translate([0, 0, pm_height+1])
        pulley_mount_deck();
    }
    translate([-y_rod_spacing/2, depth/2+eps, 0])
      rotate([90, 0, 0])
        cylinder(d=rod_pressfit_horiz, h=depth*1.1);
    translate([+y_rod_spacing/2, depth/2+eps, 0])
      rotate([90, 0, 0])
        cylinder(d=rod_pressfit_horiz, h=depth*1.1);
    translate([0, 0, pm_height+1])
      pulley_mount_holes();
  }
}

y_axis_endcap();
